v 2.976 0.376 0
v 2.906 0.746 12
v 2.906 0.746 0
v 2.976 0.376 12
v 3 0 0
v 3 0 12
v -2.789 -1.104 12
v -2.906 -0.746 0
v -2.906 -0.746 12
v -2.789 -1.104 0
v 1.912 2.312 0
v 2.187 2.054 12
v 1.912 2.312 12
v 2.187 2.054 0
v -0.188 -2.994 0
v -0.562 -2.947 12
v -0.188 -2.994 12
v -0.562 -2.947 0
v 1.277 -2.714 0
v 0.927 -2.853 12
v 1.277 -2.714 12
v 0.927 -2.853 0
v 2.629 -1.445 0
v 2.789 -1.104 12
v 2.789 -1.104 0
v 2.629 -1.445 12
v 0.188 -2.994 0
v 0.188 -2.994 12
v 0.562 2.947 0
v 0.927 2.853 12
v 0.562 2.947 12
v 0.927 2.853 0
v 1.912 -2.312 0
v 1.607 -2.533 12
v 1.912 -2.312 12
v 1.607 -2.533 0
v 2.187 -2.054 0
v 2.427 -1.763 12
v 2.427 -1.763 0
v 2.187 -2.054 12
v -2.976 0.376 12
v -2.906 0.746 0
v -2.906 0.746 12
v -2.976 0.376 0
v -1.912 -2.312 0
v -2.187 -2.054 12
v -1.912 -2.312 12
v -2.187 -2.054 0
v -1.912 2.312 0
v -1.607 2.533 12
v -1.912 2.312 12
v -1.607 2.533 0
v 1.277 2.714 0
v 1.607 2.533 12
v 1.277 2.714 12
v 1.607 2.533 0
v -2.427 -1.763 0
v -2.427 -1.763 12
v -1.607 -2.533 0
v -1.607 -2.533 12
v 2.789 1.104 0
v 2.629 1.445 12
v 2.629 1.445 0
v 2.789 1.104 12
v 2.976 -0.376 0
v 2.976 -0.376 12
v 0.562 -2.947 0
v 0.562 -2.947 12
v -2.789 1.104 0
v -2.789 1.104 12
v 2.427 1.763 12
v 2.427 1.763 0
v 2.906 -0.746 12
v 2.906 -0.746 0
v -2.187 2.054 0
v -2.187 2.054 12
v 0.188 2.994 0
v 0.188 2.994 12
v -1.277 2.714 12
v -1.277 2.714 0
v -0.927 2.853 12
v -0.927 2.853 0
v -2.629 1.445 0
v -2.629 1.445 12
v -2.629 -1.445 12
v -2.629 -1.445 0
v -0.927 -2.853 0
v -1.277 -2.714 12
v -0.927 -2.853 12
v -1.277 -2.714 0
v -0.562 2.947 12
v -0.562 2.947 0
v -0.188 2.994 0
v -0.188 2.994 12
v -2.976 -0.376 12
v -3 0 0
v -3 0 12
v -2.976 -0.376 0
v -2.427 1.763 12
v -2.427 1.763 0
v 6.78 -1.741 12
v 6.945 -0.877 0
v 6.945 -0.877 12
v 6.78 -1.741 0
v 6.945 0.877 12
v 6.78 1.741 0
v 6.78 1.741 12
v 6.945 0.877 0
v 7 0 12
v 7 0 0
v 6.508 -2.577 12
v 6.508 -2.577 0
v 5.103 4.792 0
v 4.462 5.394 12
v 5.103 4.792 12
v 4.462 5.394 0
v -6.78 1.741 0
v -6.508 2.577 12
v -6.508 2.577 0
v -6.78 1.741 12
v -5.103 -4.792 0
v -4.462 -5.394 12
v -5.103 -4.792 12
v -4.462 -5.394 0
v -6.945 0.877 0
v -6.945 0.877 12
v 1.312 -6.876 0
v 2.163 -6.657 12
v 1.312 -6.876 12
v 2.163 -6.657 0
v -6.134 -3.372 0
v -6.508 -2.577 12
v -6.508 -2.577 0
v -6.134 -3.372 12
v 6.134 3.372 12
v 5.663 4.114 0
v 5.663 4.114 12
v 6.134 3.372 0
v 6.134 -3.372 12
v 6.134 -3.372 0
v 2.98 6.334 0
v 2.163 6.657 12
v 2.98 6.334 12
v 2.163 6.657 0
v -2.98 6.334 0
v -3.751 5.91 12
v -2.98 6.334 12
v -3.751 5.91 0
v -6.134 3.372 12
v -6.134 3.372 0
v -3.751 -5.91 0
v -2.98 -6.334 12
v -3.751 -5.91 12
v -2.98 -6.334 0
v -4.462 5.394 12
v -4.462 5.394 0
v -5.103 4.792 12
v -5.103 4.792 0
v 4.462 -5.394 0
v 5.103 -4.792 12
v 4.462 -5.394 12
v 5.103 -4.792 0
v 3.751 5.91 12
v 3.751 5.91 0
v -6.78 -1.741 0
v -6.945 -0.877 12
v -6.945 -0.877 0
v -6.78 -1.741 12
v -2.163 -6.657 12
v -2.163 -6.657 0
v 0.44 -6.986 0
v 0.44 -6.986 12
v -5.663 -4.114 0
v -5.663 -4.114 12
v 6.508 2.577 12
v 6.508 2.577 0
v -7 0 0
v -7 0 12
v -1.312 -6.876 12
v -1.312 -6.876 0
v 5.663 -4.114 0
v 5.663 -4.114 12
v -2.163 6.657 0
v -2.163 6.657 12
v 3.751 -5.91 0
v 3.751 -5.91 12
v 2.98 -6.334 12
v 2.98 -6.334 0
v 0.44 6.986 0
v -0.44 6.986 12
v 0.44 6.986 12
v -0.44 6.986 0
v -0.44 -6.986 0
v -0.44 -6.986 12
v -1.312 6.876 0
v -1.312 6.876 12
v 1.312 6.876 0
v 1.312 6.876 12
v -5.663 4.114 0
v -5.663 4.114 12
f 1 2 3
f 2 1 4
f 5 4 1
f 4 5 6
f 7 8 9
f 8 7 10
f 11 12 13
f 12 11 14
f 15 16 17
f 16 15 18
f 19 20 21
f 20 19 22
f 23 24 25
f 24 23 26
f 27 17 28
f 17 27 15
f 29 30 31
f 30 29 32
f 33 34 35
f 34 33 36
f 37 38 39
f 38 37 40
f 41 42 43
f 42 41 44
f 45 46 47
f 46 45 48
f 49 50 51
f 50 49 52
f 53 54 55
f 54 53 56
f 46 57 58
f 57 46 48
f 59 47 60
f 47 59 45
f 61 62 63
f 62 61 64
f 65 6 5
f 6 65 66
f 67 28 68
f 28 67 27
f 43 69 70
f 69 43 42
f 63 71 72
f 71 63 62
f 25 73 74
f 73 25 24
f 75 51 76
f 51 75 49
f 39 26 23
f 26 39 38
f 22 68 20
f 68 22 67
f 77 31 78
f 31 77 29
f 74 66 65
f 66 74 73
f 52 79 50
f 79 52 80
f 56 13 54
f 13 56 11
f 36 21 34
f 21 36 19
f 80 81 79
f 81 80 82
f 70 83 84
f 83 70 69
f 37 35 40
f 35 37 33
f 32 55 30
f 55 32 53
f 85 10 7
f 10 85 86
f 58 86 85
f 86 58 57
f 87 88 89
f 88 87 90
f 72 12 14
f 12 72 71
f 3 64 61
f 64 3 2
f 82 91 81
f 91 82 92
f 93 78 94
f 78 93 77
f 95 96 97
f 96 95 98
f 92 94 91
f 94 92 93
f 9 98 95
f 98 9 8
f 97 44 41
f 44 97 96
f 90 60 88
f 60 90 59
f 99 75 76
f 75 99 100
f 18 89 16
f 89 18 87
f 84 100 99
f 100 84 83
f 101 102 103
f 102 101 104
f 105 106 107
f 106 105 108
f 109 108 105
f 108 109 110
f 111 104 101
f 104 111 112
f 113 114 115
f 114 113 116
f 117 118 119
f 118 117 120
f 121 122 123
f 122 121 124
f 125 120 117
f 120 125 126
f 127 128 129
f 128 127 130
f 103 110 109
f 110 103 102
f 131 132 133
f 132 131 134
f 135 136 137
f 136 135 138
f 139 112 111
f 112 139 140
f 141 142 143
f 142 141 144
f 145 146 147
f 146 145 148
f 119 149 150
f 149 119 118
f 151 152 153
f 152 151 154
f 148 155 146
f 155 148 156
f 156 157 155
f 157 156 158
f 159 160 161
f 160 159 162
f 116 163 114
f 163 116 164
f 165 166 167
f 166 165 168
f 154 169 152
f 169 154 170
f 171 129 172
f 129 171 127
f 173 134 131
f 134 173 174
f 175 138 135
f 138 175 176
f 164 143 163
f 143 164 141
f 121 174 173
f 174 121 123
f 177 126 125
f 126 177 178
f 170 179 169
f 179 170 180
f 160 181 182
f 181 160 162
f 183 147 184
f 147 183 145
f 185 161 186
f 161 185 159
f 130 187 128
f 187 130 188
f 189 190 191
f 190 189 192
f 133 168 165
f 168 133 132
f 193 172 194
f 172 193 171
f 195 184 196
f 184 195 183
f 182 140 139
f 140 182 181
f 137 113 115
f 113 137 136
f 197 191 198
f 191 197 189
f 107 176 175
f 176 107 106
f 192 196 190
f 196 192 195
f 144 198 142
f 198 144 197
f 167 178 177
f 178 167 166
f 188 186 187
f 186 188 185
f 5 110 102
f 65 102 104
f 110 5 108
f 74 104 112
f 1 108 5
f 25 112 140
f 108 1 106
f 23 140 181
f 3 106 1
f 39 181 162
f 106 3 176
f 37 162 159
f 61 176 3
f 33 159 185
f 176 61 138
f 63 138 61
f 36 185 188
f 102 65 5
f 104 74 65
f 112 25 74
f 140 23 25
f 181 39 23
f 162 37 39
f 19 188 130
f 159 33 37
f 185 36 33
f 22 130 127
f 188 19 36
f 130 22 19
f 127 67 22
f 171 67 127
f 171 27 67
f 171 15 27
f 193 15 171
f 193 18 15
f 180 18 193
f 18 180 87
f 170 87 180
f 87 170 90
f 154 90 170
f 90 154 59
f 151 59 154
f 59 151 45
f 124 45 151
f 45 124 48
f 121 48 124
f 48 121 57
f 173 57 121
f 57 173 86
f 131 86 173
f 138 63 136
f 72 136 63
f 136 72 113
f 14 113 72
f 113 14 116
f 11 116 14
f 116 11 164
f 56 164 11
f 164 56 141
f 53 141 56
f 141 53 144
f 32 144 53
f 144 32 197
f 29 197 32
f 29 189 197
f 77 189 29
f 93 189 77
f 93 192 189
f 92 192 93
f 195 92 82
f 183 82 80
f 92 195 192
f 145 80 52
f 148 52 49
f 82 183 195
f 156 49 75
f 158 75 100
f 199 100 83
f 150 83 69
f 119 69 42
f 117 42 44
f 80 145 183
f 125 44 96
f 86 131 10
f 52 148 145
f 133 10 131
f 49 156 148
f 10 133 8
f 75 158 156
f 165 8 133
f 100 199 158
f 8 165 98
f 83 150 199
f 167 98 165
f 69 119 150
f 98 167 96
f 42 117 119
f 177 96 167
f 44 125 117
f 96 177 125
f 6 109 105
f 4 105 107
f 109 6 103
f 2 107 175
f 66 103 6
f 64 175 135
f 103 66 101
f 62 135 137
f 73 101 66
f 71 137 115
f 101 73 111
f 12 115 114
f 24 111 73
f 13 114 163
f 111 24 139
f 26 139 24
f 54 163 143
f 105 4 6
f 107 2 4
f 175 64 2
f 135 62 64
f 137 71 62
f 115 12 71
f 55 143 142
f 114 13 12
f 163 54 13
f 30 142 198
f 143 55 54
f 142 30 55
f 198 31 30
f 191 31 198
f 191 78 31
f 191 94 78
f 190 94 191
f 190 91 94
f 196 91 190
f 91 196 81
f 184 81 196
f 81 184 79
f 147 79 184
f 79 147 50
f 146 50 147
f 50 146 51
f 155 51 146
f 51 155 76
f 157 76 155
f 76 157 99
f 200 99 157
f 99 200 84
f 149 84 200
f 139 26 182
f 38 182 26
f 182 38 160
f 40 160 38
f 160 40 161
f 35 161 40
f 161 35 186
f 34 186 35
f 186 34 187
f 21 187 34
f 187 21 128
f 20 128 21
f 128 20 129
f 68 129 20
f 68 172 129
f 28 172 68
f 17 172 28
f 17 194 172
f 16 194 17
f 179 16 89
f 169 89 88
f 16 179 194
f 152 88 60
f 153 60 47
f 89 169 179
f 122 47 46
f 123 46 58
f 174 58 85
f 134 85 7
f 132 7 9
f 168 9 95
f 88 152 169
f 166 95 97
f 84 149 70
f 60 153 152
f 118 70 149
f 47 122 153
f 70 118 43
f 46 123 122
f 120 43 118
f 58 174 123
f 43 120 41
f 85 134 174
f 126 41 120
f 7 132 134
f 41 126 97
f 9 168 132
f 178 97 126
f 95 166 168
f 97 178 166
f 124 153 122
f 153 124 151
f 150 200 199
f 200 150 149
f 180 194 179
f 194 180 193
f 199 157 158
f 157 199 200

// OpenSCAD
$fn = 50;

difference() {
	union() {
		cylinder(h = 12, r = 7.0);
	}
	union() {
		translate(v = [0, 0, -100]) {
			cylinder(h = 200, r = 3.0);
		}
		translate(v = [0, 0, -100]) {
			cylinder(h = 200, r = 1.5);
		}
	}
}
